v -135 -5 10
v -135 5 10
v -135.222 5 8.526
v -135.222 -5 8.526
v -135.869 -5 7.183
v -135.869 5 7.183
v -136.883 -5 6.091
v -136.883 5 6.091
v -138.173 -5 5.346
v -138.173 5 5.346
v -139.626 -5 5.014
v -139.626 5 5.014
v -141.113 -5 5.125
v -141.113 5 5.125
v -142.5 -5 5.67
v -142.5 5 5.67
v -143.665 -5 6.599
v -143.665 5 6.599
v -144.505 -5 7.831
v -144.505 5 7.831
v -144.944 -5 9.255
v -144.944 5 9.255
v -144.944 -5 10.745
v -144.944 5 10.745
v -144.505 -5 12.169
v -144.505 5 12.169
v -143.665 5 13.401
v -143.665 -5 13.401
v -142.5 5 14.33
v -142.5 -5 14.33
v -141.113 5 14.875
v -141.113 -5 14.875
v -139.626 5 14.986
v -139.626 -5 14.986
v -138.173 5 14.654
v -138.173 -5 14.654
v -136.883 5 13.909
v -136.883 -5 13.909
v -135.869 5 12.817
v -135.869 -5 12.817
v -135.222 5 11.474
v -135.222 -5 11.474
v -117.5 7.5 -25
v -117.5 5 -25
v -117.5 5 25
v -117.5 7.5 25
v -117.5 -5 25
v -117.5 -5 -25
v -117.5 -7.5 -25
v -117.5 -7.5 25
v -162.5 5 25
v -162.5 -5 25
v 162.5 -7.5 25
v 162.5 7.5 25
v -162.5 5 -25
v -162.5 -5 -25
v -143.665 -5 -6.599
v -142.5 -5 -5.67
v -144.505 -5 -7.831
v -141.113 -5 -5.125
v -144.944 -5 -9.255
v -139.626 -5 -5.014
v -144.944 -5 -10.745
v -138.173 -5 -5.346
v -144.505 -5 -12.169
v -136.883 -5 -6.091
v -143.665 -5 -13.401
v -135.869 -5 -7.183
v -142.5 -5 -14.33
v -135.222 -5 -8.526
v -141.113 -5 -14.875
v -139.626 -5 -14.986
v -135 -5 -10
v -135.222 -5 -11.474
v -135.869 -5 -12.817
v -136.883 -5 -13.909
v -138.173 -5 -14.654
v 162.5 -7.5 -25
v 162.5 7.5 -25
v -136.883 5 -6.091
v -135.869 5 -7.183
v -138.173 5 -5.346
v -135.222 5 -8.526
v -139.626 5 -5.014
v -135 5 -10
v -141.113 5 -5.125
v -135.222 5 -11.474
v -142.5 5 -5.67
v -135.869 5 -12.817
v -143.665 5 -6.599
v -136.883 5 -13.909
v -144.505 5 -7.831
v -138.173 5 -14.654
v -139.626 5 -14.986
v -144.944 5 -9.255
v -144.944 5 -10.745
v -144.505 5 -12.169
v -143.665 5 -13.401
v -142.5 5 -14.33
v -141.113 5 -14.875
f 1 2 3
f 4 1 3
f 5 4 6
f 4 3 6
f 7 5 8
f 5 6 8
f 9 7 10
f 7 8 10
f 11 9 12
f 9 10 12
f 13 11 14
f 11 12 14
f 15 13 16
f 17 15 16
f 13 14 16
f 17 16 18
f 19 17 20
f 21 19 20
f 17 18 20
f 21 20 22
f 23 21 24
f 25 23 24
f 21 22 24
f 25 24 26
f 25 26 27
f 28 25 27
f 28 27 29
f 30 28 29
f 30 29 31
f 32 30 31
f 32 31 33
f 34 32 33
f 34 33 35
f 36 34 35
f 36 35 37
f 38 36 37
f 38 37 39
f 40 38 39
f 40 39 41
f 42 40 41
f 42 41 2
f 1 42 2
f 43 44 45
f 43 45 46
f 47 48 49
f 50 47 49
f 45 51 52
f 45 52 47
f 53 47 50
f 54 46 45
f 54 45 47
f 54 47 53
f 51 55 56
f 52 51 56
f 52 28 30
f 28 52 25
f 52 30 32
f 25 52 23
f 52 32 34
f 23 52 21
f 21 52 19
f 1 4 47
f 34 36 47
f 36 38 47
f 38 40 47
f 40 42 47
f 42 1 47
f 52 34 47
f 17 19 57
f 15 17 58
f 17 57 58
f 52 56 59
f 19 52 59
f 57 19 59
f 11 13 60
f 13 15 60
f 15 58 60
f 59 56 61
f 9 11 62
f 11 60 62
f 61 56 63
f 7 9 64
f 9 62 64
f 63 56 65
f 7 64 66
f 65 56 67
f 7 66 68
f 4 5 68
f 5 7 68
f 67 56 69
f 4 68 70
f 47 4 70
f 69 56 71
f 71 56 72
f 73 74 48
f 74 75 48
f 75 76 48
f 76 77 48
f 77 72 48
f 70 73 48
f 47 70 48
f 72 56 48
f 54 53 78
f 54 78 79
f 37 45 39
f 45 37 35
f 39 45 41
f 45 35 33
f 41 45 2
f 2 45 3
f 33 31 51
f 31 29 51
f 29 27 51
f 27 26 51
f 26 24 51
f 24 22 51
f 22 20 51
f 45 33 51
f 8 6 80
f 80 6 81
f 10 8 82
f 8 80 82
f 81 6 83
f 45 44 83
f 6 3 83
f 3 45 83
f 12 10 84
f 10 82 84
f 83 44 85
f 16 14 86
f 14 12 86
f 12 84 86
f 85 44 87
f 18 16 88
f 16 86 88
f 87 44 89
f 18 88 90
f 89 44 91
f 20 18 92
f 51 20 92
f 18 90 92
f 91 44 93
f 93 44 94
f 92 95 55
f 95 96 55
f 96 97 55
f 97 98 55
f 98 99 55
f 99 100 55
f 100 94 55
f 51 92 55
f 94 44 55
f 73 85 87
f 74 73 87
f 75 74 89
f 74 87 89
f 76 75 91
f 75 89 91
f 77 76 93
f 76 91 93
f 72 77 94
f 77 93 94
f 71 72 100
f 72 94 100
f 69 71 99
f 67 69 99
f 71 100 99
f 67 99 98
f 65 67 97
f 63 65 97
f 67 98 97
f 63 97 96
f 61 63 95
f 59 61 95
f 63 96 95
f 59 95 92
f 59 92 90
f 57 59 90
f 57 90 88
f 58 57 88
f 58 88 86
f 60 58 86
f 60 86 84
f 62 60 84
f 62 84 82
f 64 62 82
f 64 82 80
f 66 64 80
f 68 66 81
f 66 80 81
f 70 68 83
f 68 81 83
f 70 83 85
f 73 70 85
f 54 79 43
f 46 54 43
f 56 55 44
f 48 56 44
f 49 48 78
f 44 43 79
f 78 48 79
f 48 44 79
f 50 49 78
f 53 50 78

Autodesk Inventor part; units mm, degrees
ref_plane "YZ Plane" through (0, 0, 0) normal (1, 0, 0) x (0, 1, 0)
ref_plane "XZ Plane" through (0, 0, 0) normal (0, 1, 0) x (-1, 0, 0)
ref_plane "XY Plane" through (0, 0, 0) normal (0, 0, 1) x (1, 0, 0)
sketch "Esboço1" plane through (0, 0, 0) normal (0, 0, 1) x (1, 0, 0)
  line L0 (-162.5, -7.5) -> (-117.5, -7.5) construction
  line L1 (162.5, -7.5) -> (162.5, 7.5)
  line L2 (162.5, 7.5) -> (-117.5, 7.5)
  line L3 (-162.5, 7.5) -> (-162.5, 5) construction
  line L4 (-162.5, -7.5) -> (162.5, 7.5) construction
  line L5 (162.5, -7.5) -> (-162.5, 7.5) construction
  line L6 (-162.5, -5) -> (-117.5, -5)
  line L7 (-117.5, 5) -> (-162.5, 5)
  line L8 (-117.5, 5) -> (-117.5, 7.5)
  line L9 (-117.5, -5) -> (-117.5, -7.5)
  line L10 (-117.5, 5) -> (-117.5, -5) construction
  line L11 (-117.5, 0) -> (0, 0) construction
  line L12 (-162.5, 5) -> (-162.5, -5)
  line L13 (-162.5, -5) -> (-162.5, -7.5) construction
  line L14 (-117.5, -7.5) -> (162.5, -7.5)
  line L15 (-117.5, 7.5) -> (-162.5, 7.5) construction
  dimension "d0" = 325
  dimension "d1" = 15
  dimension "d2" = 10
  dimension "d3" = 45
extrude "Extrusão1" add sketch "Esboço1" along normal mid plane 50
sketch "Esboço2" plane through (-162.5, 5, 25) normal (0, 1, 0) x (1, 0, 0)
  line L0 (0, 0) -> (0, 50) projected
  line L1 (45, 50) -> (45, 0) projected
  circle A0 centre (22.5, 35) radius 5
  circle A1 centre (22.5, 15) radius 5
  line L2 (22.5, 15) -> (22.5, 35)
  line L3 (0, 50) -> (45, 50) projected
  line L4 (22.5, 50) -> (22.5, 74.6859)
  line L5 (22.5, 25) -> (-20.9828, 25) construction
  line L6 (0, 25) -> (-37.1648, 25) construction
  point P0 (162.5, 25)
  dimension "d14" = 10
  dimension "d15" = 10
  dimension "d16" = 20
extrude "Extrusão2" cut sketch "Esboço2" against normal up to surface (10 mm away)
sketch "ref. Motor" plane through (-117.5, -7.5, 25) normal (0, -1, 0) x (1, 0, 0)
  line L0 (280, -50) -> (280, 0) projected
  line L1 (280, -25) -> (270, -25) construction
  line L2 (270, -25) -> (270, 54.6764) construction
  point P0 (117.5, -25)
  dimension "d13" = 10
equation "\"d15\" = d14"
properties part number "Pás - Hastes"
